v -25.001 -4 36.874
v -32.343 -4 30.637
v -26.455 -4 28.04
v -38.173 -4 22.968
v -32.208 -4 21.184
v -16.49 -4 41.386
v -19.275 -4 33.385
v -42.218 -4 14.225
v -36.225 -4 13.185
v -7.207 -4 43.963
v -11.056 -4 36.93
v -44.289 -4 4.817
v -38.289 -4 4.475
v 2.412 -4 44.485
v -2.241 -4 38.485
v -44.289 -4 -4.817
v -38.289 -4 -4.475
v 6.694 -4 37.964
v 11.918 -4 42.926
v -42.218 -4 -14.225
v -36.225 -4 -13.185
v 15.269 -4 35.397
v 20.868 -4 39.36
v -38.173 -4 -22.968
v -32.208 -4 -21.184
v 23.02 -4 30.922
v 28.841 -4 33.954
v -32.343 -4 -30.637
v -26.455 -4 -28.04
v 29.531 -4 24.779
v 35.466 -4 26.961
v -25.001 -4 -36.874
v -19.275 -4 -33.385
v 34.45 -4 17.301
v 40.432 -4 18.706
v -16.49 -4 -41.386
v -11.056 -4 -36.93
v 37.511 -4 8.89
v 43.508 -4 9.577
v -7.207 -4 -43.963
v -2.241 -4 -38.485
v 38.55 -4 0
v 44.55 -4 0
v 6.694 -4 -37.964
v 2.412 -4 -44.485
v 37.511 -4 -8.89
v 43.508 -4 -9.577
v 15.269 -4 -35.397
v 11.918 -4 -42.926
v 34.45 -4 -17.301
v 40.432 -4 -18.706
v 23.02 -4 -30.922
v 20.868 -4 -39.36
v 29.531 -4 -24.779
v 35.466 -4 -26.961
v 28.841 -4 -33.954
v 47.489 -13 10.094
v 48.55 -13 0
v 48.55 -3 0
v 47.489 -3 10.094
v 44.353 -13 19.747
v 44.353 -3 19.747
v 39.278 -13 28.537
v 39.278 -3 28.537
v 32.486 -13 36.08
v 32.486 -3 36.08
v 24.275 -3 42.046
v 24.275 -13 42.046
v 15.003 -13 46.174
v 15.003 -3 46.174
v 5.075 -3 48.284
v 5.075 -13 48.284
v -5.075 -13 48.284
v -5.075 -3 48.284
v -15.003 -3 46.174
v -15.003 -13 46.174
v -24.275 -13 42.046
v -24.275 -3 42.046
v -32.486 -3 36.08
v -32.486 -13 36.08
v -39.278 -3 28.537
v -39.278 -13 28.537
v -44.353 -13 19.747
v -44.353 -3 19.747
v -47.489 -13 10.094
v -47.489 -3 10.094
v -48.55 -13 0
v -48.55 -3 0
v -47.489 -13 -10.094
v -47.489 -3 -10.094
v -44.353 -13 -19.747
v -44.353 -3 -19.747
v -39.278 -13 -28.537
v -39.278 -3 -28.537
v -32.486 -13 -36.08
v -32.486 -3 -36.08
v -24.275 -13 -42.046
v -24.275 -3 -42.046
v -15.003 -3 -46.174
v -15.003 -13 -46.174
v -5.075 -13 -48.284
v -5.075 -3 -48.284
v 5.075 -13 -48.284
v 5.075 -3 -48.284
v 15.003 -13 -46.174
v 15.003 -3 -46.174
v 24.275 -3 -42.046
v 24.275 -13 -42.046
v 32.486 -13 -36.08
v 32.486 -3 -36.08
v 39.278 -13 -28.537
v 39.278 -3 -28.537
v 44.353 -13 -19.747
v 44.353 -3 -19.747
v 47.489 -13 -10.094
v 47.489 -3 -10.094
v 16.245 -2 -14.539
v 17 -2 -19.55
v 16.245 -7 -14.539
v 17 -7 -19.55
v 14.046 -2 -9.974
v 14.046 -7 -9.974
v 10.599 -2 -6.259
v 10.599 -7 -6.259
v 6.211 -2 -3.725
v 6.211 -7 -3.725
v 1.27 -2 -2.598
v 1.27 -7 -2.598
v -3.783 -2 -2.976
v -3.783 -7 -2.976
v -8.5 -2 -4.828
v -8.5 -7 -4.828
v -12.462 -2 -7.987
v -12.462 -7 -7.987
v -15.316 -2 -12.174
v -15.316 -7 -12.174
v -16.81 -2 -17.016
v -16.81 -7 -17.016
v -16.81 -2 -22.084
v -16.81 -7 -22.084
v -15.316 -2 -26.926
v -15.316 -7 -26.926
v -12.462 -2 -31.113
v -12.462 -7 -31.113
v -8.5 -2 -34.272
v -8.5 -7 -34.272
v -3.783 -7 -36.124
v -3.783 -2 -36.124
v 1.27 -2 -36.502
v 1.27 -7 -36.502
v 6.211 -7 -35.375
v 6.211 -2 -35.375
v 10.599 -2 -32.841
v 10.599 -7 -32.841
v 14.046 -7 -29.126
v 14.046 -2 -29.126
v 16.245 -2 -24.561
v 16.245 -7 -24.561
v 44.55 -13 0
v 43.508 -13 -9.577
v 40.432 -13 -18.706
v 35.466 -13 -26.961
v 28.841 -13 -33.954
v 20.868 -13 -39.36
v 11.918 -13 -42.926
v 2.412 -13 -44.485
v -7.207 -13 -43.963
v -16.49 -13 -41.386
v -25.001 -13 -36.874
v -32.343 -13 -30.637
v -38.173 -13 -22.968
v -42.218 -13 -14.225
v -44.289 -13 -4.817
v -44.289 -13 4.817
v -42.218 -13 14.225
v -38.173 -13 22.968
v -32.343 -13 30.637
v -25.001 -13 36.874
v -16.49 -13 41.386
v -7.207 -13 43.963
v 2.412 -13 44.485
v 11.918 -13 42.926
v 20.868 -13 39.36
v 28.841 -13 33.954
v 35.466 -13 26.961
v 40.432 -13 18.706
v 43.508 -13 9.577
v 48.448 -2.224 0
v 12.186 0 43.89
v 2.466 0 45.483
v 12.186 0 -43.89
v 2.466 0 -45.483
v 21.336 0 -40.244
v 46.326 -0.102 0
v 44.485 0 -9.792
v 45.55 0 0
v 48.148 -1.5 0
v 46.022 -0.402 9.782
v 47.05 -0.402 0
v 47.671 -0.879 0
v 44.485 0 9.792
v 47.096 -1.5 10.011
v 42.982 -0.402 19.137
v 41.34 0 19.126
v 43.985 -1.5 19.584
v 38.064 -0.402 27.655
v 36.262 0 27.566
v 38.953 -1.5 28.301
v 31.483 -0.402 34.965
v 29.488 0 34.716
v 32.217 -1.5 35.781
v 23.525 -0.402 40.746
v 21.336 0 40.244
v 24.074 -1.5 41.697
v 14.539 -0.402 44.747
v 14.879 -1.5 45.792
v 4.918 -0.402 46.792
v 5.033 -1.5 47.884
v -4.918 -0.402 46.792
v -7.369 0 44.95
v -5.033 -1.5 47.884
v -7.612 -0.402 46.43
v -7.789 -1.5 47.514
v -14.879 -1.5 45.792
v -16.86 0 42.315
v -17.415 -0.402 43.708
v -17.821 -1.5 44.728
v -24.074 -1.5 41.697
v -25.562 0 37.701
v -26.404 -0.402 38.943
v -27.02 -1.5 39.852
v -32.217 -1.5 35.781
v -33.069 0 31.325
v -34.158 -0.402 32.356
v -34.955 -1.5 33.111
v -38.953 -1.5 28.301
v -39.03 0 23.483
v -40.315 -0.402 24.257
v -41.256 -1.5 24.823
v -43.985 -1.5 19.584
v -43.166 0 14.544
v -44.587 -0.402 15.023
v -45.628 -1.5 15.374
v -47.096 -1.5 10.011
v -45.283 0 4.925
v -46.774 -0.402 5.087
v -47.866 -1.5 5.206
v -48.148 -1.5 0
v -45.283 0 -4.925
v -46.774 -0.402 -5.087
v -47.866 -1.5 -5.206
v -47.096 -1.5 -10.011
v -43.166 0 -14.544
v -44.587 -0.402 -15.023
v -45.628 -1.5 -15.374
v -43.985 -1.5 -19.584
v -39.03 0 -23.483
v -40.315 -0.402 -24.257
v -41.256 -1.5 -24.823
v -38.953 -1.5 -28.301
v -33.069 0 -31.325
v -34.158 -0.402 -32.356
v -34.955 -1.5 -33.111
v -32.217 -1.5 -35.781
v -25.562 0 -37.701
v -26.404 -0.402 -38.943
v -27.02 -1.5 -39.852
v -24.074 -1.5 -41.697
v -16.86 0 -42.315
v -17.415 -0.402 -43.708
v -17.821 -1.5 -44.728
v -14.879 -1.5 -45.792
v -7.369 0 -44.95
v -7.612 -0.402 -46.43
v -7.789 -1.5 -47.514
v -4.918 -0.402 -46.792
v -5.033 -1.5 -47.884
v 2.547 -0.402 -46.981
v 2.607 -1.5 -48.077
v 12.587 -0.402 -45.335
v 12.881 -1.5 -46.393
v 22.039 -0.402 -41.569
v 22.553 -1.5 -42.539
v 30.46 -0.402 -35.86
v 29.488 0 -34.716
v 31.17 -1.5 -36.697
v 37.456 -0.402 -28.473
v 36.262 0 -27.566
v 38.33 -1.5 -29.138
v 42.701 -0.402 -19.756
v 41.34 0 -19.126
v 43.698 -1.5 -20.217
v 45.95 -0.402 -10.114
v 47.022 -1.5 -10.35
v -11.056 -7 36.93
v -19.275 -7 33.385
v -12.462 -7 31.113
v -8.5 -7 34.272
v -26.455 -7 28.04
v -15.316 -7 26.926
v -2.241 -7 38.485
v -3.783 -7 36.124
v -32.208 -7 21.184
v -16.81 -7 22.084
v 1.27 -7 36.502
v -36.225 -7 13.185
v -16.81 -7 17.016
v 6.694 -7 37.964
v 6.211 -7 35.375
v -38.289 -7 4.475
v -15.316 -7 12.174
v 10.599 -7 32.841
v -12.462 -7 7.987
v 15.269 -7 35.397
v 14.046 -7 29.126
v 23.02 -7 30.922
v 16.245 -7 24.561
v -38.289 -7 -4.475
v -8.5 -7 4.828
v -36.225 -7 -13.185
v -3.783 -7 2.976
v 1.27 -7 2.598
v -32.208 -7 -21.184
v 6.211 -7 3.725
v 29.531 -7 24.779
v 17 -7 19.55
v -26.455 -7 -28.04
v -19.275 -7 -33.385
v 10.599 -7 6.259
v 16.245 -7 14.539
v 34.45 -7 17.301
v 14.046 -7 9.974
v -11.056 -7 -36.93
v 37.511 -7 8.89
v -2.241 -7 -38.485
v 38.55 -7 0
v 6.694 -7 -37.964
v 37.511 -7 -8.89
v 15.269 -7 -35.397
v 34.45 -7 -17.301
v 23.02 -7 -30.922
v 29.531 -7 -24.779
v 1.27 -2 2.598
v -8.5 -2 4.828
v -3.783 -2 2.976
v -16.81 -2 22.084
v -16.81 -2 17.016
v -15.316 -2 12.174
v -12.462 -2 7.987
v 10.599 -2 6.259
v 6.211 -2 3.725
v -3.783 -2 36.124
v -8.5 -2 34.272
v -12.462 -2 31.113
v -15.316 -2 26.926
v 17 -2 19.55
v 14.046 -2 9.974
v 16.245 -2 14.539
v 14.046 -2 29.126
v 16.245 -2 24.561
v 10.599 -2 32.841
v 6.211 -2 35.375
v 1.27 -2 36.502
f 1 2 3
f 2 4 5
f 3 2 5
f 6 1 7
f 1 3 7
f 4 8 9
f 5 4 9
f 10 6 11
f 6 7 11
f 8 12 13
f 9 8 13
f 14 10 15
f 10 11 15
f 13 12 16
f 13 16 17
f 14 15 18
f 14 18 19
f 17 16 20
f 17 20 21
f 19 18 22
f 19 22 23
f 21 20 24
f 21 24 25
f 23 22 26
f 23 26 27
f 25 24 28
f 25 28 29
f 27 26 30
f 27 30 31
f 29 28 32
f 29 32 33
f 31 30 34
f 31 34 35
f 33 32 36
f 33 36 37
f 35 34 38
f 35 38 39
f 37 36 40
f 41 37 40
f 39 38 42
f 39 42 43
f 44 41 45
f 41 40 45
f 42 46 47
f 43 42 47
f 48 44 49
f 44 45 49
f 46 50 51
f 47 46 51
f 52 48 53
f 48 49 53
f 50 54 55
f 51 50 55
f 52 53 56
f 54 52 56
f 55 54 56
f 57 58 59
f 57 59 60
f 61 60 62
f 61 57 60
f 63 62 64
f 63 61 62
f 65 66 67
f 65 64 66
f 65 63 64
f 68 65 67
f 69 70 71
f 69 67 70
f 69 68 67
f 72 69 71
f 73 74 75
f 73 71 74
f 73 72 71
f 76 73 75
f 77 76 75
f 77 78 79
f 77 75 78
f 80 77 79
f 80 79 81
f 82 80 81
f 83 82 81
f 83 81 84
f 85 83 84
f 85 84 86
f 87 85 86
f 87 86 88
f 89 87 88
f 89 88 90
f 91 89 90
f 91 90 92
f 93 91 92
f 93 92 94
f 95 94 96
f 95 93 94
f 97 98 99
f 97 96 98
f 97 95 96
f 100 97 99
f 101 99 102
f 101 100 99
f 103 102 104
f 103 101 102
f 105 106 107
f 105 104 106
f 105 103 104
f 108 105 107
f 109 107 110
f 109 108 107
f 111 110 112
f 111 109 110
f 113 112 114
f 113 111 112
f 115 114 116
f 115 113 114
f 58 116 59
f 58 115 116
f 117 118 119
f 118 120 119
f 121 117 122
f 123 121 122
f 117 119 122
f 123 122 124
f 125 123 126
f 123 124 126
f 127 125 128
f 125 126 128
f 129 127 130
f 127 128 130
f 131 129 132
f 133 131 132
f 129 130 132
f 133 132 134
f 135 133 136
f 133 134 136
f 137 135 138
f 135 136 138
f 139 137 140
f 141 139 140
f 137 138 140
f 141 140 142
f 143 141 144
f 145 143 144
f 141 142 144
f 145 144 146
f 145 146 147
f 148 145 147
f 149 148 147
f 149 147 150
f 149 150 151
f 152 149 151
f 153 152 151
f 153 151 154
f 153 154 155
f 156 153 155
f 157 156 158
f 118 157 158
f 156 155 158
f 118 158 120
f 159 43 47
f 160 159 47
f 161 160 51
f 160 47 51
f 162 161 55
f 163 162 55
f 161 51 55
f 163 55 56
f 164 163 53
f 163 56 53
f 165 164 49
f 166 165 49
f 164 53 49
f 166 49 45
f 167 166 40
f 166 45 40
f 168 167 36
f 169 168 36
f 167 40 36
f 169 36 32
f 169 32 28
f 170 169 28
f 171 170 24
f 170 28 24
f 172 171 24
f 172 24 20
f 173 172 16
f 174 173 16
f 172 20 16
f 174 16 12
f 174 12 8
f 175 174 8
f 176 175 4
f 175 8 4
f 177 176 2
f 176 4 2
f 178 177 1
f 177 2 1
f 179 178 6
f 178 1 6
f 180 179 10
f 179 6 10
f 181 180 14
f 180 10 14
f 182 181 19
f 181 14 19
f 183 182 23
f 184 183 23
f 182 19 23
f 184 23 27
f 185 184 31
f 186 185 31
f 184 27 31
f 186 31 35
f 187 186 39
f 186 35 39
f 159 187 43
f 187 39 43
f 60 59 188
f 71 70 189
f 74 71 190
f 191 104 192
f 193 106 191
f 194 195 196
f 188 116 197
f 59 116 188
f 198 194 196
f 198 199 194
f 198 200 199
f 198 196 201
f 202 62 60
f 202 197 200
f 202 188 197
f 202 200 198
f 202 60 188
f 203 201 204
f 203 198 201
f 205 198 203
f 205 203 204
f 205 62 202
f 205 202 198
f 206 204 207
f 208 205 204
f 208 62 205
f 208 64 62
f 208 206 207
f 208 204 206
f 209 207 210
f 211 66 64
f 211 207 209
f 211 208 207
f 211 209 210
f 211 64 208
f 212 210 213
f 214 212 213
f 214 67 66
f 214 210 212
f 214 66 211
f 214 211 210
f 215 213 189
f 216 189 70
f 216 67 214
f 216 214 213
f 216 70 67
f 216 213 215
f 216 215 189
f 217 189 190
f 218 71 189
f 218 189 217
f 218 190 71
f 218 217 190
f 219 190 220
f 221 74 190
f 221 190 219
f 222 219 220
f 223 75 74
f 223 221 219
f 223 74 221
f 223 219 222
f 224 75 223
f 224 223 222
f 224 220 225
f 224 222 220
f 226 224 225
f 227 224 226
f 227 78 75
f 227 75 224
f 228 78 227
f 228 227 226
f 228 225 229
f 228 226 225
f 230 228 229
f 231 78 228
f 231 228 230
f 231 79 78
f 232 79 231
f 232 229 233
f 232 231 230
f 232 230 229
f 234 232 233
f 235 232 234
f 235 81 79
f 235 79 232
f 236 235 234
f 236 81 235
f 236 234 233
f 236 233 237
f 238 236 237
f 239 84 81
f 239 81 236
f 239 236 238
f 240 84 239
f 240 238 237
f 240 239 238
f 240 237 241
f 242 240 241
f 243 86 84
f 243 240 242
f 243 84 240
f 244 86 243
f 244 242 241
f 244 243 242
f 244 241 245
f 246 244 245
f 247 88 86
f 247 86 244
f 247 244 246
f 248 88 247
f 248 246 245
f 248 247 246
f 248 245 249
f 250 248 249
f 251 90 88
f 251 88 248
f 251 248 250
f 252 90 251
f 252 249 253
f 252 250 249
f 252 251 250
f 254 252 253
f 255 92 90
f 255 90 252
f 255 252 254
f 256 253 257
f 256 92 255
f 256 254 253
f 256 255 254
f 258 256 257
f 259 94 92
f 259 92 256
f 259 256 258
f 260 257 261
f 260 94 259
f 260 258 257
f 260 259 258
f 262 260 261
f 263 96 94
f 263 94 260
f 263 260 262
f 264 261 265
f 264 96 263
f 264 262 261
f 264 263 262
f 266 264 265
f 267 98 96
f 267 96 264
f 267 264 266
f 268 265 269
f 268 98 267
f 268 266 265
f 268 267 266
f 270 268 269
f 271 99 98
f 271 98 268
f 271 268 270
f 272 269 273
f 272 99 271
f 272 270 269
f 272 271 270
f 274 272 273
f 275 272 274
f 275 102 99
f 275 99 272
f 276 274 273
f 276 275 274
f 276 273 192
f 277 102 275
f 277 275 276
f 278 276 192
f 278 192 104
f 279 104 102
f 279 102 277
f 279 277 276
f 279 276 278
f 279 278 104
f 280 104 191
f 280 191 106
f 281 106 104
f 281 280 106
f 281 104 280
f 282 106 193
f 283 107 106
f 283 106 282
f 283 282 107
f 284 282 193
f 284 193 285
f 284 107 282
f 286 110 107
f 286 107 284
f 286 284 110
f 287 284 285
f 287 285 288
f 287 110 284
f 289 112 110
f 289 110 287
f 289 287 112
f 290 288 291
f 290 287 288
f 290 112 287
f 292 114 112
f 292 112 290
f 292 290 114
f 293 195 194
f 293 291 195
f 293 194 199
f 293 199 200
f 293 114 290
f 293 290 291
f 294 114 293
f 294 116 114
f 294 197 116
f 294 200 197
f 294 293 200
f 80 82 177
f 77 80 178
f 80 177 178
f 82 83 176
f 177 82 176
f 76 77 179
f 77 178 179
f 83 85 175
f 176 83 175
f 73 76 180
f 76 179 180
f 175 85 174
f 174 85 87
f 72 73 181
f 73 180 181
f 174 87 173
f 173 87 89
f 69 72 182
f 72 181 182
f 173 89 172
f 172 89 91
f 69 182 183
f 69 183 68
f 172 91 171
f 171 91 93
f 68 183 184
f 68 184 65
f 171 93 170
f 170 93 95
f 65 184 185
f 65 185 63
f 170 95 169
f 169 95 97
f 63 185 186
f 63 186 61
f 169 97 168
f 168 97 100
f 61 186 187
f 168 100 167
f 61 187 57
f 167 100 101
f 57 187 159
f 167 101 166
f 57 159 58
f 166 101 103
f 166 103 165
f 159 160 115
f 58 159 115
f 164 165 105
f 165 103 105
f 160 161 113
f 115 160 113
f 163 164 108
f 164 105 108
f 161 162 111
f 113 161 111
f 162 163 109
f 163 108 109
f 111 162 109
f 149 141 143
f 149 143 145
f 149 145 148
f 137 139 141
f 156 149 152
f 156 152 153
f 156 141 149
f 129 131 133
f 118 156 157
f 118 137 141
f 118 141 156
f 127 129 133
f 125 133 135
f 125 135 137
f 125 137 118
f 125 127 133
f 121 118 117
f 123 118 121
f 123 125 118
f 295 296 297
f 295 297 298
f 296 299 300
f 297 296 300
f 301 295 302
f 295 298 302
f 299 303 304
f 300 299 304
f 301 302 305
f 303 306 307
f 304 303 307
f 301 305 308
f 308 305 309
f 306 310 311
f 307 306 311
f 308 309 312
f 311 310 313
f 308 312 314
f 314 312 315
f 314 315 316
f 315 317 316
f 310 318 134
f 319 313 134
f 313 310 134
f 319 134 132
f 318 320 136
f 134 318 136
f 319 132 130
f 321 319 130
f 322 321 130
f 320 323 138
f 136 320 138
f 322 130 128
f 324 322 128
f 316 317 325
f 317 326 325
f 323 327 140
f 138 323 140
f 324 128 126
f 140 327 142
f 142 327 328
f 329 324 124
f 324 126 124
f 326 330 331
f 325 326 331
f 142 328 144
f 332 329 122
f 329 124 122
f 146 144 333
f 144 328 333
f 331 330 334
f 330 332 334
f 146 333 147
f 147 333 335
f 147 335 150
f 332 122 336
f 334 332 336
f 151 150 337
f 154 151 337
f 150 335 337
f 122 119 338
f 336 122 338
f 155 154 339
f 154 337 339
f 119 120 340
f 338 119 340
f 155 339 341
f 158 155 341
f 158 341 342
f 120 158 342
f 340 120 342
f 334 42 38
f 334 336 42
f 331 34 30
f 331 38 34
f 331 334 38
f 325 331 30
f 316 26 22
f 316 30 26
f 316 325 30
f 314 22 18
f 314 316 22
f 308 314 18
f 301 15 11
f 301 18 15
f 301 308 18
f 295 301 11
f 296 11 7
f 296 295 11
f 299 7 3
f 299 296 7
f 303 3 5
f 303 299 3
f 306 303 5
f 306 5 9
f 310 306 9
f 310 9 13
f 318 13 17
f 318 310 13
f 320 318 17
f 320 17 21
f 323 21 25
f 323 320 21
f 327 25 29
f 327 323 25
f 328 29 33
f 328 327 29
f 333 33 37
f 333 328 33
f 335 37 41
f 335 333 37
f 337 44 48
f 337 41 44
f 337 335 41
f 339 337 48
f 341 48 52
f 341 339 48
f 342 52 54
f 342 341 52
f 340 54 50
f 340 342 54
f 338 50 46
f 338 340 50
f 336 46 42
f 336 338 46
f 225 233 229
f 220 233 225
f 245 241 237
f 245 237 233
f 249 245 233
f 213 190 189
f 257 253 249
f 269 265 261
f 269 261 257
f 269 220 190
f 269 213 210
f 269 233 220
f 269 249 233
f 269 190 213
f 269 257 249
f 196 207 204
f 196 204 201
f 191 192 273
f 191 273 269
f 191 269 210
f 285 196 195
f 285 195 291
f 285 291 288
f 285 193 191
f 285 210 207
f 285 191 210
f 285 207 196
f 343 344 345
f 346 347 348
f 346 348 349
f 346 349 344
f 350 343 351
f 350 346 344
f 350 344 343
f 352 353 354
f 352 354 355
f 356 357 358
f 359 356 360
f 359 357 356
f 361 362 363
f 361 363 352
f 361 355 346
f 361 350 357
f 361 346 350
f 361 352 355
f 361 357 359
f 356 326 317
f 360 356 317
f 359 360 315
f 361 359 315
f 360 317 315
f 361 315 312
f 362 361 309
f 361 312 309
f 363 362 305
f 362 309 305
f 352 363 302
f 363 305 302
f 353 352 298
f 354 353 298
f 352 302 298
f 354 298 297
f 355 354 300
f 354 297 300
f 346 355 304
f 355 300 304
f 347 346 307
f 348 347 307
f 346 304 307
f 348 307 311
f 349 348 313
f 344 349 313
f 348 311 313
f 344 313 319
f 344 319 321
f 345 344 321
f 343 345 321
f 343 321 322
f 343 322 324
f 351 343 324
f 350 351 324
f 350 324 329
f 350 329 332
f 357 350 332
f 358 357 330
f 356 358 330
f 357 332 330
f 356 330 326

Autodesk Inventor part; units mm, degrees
ref_plane "YZ Plane" through (0, 0, 0) normal (1, 0, 0) x (0, 1, 0)
ref_plane "XZ Plane" through (0, 0, 0) normal (0, 1, 0) x (-1, 0, 0)
ref_plane "XY Plane" through (0, 0, 0) normal (0, 0, 1) x (1, 0, 0)
sketch "Sketch2" plane through (0, 0, 0) normal (0, 0, 1) x (1, 0, 0)
  line L0 (0, 0) -> (48.55, 0)
  line L1 (48.55, 0) -> (48.55, -13)
  line L2 (48.55, -13) -> (44.55, -13)
  line L3 (44.55, -13) -> (44.55, -4)
  line L4 (44.55, -4) -> (38.55, -4)
  line L5 (38.55, -4) -> (38.55, -7)
  line L6 (38.55, -7) -> (0, -7)
  line L7 (0, -7) -> (0, 0)
  dimension "d0" = 48.55
  dimension "d1" = 4
  dimension "d2" = 6
  dimension "d3" = 13
  dimension "d4" = 4
  dimension "d5" = 7
revolve "Revolution1" add sketch "Sketch2" angle 360 about axis through (0, -7, 0) along (0, 1, 0)
fillet "Fillet1" radius 3 1 edges at (-48.55, 0, 0)
sketch "Sketch3" plane through (0, -7, 0) normal (0, -1, 0) x (1, 0, 0)
  circle A0 centre (0, -19.55) radius 17
  circle A1 centre (0, 0) radius 38.55 projected
  circle A2 centre (0, 19.55) radius 17
  dimension "d8" = 34
  dimension "d11" = 360
  dimension "d15" = 19.55
extrude "Extrusion1" cut sketch "Sketch3" against normal blind 5 contours A0 | A2
properties part number "lid-v1"
